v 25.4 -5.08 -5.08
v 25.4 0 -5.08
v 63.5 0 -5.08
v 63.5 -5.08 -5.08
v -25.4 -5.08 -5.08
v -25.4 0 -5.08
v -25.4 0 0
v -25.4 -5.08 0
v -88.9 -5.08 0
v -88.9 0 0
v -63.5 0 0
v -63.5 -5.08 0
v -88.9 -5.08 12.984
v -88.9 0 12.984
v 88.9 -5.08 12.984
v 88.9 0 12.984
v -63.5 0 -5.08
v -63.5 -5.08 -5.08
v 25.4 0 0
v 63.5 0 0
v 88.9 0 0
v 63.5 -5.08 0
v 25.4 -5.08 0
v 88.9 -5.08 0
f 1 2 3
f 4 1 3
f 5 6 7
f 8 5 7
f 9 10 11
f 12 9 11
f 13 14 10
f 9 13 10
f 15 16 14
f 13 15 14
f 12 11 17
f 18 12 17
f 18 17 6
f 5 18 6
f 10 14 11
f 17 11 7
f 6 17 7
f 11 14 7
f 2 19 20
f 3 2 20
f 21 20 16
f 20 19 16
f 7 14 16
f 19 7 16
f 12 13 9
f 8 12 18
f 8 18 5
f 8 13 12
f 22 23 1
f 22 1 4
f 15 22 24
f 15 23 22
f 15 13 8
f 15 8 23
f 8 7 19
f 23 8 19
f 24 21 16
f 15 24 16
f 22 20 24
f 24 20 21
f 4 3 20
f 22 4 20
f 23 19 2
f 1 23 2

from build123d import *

# Parameters (mm, degrees)
F1_DEPTH = 5.08


# Not quite as in the source:
# - a feature names something its author has since deleted; it is built from what else it names


with BuildPart() as f1:
    # F0 (on Front) → F1 (new body)
    with BuildSketch(Plane.XZ):
        Polygon((-25.4, 0), (0, 0), (25.4, 0), (25.4, -5.08), (63.5, -5.08), (63.5, 0), (88.9, 0), (88.9, 3.1722693238), (88.9, 6.3445386477), (88.9, 12.9838371649), (-88.9, 12.9838371649), (-88.9, 6.3445386477), (-88.9, 3.1722693238), (-88.9, 0), (-63.5, 0), (-63.5, -5.08), (-25.4, -5.08), align=None)
    extrude(amount=F1_DEPTH)


solid = f1.part
